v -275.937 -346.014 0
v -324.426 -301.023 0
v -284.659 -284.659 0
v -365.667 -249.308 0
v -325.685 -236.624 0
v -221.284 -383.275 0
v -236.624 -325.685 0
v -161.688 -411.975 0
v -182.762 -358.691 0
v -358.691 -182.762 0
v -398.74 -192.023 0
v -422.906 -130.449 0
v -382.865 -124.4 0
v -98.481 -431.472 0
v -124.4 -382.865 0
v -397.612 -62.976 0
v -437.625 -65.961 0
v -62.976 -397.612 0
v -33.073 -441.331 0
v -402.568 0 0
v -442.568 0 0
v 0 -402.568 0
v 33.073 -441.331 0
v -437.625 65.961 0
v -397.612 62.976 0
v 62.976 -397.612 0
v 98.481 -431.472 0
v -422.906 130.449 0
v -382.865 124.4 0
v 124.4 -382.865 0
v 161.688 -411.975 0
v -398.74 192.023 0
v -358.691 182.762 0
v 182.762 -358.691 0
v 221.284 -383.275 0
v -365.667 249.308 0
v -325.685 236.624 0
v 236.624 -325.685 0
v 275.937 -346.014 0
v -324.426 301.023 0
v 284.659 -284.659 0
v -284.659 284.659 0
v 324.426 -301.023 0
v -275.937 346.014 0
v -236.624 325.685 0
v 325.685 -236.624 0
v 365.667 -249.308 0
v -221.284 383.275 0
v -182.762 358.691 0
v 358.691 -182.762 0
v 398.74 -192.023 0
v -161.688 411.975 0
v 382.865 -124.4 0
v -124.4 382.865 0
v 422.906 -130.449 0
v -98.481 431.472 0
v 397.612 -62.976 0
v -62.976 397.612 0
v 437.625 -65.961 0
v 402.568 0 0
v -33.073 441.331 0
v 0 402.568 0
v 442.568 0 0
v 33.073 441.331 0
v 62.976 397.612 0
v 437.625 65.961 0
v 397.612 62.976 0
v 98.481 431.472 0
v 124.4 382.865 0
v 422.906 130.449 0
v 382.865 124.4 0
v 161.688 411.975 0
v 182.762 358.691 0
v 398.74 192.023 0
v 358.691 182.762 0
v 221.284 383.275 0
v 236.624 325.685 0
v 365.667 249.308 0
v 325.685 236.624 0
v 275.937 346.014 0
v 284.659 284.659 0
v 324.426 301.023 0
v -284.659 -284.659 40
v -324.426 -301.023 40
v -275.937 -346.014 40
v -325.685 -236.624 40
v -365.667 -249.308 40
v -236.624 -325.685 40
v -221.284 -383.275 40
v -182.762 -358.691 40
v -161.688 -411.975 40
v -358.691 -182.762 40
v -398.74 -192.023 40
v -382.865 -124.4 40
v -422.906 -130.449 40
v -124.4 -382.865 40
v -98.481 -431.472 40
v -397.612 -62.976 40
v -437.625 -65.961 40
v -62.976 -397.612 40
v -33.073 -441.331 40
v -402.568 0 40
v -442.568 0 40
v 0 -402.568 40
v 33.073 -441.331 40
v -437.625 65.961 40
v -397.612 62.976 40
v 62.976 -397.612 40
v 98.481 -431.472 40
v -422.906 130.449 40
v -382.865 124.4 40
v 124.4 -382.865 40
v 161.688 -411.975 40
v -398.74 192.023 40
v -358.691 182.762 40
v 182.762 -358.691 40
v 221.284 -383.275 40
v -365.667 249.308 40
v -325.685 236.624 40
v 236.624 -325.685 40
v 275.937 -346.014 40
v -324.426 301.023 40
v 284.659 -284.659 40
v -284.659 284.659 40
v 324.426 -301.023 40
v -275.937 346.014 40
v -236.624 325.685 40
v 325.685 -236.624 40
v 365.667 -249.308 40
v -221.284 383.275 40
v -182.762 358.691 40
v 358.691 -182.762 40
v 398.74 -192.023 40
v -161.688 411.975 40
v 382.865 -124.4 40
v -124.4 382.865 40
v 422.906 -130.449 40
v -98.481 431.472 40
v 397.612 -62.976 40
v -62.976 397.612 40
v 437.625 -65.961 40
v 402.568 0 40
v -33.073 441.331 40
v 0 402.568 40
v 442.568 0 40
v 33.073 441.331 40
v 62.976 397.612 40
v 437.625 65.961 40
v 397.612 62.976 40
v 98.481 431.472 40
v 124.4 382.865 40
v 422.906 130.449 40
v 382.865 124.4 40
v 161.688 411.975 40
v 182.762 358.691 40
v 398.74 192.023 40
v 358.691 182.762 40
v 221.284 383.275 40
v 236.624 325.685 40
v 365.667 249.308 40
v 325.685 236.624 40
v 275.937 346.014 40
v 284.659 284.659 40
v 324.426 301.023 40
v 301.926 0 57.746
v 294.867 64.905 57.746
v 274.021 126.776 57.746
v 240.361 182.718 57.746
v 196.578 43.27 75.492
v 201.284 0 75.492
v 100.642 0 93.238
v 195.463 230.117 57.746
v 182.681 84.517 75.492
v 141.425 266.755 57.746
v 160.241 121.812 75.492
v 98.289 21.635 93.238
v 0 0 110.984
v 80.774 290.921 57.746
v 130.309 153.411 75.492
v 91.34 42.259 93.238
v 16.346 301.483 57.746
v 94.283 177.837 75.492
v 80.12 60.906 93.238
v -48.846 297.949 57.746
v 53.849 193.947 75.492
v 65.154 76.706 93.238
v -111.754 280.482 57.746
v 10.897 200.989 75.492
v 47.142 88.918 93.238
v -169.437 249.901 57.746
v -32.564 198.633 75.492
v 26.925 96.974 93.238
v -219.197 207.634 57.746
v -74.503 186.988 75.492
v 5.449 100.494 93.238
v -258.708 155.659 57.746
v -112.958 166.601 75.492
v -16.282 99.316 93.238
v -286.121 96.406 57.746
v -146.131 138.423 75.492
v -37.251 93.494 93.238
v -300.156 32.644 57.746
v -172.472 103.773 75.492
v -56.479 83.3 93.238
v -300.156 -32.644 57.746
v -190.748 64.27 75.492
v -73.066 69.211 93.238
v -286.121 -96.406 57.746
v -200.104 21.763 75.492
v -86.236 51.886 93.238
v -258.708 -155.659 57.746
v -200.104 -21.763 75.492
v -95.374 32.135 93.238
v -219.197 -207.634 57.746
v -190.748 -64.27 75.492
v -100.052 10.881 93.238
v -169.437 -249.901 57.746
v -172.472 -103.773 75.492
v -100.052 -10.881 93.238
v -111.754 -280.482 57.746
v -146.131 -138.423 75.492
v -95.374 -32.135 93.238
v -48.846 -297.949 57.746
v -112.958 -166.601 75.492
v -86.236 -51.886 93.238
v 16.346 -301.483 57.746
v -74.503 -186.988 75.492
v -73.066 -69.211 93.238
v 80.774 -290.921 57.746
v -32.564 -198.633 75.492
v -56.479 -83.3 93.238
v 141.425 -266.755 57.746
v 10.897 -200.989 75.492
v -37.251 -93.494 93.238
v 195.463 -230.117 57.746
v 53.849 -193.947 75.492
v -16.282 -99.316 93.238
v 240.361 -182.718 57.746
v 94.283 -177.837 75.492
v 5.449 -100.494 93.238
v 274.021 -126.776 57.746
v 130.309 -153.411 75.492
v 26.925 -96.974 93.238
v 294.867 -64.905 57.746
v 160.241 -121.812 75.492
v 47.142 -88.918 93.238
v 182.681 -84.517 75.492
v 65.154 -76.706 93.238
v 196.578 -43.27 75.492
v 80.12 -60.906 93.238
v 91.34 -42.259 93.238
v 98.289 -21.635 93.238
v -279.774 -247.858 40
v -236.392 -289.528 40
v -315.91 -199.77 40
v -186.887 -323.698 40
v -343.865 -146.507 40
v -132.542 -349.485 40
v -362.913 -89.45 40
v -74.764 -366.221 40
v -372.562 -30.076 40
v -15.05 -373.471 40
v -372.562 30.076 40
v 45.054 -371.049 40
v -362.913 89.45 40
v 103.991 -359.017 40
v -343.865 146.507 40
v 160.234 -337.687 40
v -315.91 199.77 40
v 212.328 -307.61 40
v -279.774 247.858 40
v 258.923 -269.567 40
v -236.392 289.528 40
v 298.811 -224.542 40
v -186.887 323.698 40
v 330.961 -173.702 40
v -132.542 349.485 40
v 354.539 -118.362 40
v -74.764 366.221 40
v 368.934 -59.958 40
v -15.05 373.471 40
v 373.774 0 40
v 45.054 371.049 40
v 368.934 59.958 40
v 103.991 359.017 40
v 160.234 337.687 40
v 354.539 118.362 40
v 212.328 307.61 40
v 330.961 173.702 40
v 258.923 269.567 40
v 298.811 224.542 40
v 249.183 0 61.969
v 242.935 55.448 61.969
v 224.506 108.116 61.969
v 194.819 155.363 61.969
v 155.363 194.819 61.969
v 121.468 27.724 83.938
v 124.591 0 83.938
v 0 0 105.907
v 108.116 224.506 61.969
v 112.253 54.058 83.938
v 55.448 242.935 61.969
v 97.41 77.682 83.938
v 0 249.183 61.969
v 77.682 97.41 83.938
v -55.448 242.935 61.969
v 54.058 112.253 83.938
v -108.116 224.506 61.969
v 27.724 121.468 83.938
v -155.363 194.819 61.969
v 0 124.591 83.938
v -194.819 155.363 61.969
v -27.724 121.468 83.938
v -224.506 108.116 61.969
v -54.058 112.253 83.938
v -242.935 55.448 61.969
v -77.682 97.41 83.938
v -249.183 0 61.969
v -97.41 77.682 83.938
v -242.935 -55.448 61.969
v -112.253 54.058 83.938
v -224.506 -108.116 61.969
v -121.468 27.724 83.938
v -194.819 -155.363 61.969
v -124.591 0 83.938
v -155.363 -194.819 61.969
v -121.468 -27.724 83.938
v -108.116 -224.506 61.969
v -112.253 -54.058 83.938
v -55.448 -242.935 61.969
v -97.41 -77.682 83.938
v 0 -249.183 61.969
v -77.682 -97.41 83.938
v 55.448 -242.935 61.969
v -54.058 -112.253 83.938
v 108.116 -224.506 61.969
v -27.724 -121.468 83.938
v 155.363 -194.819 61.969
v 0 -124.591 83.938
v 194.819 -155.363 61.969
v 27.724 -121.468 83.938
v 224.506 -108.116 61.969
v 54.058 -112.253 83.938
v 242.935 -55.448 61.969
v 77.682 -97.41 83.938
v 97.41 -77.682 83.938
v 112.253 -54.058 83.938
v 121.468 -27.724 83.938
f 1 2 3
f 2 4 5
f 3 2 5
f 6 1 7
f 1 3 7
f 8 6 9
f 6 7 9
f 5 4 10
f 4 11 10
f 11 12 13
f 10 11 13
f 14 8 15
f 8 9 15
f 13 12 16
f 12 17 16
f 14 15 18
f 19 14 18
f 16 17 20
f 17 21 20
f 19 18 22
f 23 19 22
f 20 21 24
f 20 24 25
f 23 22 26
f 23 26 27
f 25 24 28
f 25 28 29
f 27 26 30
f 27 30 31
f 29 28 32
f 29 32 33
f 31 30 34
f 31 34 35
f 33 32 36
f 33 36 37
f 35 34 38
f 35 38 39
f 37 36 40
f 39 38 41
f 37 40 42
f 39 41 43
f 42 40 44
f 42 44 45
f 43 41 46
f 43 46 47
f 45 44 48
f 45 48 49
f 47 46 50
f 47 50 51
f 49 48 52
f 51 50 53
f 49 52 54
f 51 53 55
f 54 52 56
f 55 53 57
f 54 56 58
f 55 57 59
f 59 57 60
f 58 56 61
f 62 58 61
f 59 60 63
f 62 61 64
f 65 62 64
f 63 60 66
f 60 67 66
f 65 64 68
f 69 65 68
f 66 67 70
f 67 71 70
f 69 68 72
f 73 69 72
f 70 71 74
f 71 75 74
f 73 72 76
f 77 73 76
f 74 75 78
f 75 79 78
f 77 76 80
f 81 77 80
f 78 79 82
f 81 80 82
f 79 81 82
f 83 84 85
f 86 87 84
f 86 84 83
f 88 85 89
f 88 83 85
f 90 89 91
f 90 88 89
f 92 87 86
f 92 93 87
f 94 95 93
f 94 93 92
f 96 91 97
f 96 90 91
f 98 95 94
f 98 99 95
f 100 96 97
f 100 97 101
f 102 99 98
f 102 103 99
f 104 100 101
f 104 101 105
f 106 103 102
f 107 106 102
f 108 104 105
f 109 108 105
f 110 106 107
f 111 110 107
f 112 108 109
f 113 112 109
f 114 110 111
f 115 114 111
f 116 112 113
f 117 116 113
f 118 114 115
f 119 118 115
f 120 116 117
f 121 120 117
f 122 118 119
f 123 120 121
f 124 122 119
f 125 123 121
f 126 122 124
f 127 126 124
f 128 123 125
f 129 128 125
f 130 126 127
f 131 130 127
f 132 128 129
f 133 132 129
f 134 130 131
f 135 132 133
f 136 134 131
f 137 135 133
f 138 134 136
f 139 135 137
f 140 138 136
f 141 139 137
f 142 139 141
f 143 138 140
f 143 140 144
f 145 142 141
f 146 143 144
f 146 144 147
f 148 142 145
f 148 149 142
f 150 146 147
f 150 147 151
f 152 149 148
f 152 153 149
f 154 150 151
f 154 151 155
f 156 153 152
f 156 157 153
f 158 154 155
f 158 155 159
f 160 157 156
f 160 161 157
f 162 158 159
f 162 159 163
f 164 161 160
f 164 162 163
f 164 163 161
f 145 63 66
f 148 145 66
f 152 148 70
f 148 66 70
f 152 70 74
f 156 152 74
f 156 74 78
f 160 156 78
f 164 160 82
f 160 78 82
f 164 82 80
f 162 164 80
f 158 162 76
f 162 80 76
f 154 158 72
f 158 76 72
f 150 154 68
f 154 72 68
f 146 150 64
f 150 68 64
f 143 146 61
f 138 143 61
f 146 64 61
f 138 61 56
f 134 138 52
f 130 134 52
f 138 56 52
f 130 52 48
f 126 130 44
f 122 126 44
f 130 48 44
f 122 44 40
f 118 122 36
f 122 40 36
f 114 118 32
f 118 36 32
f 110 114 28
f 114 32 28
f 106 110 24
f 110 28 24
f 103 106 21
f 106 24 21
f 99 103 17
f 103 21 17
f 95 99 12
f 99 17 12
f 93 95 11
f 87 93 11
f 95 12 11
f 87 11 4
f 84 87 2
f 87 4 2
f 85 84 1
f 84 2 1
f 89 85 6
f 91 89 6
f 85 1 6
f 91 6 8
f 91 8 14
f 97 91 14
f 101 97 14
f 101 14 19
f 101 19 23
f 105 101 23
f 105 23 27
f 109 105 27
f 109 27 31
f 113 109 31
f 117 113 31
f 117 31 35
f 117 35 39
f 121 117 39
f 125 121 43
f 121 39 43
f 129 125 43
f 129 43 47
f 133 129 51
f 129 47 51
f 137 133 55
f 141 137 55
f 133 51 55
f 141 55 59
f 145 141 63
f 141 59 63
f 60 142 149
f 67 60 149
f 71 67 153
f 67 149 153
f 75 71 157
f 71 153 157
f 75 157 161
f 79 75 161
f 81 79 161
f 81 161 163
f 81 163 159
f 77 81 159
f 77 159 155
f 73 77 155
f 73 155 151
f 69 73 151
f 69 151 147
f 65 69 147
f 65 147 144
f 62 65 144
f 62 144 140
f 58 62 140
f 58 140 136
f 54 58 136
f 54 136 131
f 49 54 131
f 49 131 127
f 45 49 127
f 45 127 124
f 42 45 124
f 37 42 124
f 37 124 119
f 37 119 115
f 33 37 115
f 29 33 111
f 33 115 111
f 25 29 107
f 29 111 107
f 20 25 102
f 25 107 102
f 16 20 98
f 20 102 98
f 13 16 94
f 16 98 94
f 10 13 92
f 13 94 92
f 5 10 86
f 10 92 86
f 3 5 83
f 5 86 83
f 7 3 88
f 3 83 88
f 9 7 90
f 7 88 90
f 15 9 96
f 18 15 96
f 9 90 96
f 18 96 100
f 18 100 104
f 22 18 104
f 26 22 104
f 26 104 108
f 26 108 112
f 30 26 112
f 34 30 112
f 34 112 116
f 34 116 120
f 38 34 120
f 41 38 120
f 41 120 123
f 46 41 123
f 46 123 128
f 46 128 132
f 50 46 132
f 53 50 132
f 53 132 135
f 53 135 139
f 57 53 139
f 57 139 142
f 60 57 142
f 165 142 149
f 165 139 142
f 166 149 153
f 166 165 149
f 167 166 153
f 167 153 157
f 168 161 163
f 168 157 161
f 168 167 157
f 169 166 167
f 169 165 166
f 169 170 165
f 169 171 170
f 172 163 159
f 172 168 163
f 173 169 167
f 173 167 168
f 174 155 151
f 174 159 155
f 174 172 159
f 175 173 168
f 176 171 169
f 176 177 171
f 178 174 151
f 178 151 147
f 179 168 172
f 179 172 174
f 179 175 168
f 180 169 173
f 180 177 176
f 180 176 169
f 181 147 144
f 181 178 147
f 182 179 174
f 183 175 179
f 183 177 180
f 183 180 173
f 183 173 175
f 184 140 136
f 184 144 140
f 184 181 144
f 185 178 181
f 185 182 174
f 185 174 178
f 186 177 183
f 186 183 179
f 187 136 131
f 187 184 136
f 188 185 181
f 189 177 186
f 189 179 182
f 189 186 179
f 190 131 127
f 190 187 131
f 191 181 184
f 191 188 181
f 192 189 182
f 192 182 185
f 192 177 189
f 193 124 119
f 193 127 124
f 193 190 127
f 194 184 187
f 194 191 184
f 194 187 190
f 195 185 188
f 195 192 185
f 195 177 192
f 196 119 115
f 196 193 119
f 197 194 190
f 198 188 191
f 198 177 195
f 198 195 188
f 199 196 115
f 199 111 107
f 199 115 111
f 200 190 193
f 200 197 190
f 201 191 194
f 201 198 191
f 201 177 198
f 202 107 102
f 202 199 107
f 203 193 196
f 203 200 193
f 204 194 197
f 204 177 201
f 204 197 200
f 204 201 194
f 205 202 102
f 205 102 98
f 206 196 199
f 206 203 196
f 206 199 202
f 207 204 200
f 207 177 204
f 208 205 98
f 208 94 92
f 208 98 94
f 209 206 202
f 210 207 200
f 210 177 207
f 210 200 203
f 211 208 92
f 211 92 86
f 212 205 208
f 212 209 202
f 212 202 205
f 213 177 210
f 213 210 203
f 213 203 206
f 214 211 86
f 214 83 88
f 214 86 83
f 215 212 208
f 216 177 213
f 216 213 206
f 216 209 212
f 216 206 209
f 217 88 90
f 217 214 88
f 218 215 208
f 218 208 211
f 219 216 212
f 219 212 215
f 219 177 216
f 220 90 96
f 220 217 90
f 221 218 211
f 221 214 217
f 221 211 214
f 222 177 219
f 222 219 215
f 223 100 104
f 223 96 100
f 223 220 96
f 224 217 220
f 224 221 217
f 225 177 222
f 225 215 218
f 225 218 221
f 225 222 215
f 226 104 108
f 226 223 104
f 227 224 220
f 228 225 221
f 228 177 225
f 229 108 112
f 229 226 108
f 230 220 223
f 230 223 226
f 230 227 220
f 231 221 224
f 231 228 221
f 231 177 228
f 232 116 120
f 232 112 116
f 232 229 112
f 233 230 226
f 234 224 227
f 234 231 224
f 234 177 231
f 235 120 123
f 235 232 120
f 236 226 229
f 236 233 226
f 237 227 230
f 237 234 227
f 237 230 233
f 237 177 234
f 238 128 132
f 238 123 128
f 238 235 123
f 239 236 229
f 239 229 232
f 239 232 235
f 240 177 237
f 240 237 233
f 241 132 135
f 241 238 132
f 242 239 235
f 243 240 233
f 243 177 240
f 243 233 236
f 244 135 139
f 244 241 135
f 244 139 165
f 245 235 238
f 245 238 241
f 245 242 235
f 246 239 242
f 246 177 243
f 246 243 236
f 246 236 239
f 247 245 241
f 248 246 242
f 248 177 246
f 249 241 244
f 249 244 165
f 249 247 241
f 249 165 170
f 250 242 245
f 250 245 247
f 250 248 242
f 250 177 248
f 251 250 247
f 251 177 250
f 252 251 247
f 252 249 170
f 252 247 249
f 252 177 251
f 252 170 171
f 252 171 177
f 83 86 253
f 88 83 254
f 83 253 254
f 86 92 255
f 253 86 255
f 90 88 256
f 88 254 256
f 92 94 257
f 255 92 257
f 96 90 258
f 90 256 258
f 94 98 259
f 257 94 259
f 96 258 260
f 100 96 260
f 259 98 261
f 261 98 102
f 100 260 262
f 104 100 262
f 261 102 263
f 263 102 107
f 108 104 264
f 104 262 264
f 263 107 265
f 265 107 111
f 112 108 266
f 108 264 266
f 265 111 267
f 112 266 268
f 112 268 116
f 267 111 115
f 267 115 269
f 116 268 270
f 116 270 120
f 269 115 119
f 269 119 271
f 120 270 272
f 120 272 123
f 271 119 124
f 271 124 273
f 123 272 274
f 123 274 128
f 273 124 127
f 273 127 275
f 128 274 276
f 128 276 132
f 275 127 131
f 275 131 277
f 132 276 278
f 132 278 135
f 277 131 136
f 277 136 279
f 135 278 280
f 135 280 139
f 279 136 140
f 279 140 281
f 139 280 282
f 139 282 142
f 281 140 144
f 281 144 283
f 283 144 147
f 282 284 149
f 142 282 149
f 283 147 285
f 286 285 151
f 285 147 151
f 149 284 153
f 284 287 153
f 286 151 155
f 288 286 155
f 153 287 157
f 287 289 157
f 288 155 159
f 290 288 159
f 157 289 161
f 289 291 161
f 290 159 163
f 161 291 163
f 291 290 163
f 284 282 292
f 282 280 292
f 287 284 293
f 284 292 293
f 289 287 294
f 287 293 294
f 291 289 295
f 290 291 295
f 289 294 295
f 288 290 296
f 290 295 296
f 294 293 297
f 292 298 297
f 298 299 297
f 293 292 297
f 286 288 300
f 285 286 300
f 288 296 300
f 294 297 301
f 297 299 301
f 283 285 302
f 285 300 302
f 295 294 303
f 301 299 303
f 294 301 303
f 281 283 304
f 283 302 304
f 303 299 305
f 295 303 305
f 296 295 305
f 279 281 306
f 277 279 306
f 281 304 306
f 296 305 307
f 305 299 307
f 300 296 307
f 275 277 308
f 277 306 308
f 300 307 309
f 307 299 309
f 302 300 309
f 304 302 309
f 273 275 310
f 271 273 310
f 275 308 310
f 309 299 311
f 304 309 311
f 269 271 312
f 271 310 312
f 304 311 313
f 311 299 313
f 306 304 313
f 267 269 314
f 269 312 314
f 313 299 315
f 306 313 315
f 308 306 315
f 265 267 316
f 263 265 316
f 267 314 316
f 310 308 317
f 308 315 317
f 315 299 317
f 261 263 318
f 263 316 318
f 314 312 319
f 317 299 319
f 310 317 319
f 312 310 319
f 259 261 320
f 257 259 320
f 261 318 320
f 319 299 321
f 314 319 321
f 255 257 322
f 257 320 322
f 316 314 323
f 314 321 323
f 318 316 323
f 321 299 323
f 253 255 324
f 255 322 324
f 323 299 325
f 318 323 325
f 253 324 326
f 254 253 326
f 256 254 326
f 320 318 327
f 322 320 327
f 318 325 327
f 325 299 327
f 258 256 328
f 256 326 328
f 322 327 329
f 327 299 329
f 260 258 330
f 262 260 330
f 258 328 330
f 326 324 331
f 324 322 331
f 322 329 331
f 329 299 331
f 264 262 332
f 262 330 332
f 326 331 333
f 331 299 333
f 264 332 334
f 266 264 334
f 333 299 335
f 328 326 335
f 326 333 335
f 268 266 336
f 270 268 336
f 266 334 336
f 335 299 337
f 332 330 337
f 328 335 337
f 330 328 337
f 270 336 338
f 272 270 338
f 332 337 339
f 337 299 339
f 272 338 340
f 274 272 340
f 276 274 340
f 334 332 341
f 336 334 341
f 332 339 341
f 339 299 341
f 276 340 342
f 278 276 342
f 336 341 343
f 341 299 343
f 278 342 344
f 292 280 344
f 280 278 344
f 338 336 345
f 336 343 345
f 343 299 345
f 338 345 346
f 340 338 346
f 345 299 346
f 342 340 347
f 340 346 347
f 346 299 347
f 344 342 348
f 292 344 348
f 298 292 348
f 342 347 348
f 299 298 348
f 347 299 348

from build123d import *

# Parameters (mm, degrees)
F0_R     = 442.5682796517
F1_DEPTH = 40
F2_R     = 402.5682796517
F3_DEPTH = 93.98
F4_R     = 402.5682796517
F5_DEPTH = 100
F5_TAPER = 80
F6_T     = -5


with BuildPart() as f1:
    # F0 (on Top) → F1 (new body)
    with BuildSketch(Plane.XY):
        Circle(F0_R)
    extrude(amount=F1_DEPTH)

    # F2 (on face) → F3 (cut)
    with BuildSketch(Plane.XY.offset(40)):
        Circle(F2_R)
    extrude(amount=-F3_DEPTH, mode=Mode.SUBTRACT)


with BuildPart() as f5:
    # F4 (on face) → F5 (new body)
    with BuildSketch(Plane.XY.offset(40)):
        Circle(F4_R)
    extrude(amount=F5_DEPTH, taper=F5_TAPER)

    # F6
    f6_openings = [f5.faces().sort_by_distance(p)[0] for p in [
        (0, 0, 40),
    ]]
    offset(amount=F6_T, openings=f6_openings)


solid = Compound([f1.part, f5.part])
